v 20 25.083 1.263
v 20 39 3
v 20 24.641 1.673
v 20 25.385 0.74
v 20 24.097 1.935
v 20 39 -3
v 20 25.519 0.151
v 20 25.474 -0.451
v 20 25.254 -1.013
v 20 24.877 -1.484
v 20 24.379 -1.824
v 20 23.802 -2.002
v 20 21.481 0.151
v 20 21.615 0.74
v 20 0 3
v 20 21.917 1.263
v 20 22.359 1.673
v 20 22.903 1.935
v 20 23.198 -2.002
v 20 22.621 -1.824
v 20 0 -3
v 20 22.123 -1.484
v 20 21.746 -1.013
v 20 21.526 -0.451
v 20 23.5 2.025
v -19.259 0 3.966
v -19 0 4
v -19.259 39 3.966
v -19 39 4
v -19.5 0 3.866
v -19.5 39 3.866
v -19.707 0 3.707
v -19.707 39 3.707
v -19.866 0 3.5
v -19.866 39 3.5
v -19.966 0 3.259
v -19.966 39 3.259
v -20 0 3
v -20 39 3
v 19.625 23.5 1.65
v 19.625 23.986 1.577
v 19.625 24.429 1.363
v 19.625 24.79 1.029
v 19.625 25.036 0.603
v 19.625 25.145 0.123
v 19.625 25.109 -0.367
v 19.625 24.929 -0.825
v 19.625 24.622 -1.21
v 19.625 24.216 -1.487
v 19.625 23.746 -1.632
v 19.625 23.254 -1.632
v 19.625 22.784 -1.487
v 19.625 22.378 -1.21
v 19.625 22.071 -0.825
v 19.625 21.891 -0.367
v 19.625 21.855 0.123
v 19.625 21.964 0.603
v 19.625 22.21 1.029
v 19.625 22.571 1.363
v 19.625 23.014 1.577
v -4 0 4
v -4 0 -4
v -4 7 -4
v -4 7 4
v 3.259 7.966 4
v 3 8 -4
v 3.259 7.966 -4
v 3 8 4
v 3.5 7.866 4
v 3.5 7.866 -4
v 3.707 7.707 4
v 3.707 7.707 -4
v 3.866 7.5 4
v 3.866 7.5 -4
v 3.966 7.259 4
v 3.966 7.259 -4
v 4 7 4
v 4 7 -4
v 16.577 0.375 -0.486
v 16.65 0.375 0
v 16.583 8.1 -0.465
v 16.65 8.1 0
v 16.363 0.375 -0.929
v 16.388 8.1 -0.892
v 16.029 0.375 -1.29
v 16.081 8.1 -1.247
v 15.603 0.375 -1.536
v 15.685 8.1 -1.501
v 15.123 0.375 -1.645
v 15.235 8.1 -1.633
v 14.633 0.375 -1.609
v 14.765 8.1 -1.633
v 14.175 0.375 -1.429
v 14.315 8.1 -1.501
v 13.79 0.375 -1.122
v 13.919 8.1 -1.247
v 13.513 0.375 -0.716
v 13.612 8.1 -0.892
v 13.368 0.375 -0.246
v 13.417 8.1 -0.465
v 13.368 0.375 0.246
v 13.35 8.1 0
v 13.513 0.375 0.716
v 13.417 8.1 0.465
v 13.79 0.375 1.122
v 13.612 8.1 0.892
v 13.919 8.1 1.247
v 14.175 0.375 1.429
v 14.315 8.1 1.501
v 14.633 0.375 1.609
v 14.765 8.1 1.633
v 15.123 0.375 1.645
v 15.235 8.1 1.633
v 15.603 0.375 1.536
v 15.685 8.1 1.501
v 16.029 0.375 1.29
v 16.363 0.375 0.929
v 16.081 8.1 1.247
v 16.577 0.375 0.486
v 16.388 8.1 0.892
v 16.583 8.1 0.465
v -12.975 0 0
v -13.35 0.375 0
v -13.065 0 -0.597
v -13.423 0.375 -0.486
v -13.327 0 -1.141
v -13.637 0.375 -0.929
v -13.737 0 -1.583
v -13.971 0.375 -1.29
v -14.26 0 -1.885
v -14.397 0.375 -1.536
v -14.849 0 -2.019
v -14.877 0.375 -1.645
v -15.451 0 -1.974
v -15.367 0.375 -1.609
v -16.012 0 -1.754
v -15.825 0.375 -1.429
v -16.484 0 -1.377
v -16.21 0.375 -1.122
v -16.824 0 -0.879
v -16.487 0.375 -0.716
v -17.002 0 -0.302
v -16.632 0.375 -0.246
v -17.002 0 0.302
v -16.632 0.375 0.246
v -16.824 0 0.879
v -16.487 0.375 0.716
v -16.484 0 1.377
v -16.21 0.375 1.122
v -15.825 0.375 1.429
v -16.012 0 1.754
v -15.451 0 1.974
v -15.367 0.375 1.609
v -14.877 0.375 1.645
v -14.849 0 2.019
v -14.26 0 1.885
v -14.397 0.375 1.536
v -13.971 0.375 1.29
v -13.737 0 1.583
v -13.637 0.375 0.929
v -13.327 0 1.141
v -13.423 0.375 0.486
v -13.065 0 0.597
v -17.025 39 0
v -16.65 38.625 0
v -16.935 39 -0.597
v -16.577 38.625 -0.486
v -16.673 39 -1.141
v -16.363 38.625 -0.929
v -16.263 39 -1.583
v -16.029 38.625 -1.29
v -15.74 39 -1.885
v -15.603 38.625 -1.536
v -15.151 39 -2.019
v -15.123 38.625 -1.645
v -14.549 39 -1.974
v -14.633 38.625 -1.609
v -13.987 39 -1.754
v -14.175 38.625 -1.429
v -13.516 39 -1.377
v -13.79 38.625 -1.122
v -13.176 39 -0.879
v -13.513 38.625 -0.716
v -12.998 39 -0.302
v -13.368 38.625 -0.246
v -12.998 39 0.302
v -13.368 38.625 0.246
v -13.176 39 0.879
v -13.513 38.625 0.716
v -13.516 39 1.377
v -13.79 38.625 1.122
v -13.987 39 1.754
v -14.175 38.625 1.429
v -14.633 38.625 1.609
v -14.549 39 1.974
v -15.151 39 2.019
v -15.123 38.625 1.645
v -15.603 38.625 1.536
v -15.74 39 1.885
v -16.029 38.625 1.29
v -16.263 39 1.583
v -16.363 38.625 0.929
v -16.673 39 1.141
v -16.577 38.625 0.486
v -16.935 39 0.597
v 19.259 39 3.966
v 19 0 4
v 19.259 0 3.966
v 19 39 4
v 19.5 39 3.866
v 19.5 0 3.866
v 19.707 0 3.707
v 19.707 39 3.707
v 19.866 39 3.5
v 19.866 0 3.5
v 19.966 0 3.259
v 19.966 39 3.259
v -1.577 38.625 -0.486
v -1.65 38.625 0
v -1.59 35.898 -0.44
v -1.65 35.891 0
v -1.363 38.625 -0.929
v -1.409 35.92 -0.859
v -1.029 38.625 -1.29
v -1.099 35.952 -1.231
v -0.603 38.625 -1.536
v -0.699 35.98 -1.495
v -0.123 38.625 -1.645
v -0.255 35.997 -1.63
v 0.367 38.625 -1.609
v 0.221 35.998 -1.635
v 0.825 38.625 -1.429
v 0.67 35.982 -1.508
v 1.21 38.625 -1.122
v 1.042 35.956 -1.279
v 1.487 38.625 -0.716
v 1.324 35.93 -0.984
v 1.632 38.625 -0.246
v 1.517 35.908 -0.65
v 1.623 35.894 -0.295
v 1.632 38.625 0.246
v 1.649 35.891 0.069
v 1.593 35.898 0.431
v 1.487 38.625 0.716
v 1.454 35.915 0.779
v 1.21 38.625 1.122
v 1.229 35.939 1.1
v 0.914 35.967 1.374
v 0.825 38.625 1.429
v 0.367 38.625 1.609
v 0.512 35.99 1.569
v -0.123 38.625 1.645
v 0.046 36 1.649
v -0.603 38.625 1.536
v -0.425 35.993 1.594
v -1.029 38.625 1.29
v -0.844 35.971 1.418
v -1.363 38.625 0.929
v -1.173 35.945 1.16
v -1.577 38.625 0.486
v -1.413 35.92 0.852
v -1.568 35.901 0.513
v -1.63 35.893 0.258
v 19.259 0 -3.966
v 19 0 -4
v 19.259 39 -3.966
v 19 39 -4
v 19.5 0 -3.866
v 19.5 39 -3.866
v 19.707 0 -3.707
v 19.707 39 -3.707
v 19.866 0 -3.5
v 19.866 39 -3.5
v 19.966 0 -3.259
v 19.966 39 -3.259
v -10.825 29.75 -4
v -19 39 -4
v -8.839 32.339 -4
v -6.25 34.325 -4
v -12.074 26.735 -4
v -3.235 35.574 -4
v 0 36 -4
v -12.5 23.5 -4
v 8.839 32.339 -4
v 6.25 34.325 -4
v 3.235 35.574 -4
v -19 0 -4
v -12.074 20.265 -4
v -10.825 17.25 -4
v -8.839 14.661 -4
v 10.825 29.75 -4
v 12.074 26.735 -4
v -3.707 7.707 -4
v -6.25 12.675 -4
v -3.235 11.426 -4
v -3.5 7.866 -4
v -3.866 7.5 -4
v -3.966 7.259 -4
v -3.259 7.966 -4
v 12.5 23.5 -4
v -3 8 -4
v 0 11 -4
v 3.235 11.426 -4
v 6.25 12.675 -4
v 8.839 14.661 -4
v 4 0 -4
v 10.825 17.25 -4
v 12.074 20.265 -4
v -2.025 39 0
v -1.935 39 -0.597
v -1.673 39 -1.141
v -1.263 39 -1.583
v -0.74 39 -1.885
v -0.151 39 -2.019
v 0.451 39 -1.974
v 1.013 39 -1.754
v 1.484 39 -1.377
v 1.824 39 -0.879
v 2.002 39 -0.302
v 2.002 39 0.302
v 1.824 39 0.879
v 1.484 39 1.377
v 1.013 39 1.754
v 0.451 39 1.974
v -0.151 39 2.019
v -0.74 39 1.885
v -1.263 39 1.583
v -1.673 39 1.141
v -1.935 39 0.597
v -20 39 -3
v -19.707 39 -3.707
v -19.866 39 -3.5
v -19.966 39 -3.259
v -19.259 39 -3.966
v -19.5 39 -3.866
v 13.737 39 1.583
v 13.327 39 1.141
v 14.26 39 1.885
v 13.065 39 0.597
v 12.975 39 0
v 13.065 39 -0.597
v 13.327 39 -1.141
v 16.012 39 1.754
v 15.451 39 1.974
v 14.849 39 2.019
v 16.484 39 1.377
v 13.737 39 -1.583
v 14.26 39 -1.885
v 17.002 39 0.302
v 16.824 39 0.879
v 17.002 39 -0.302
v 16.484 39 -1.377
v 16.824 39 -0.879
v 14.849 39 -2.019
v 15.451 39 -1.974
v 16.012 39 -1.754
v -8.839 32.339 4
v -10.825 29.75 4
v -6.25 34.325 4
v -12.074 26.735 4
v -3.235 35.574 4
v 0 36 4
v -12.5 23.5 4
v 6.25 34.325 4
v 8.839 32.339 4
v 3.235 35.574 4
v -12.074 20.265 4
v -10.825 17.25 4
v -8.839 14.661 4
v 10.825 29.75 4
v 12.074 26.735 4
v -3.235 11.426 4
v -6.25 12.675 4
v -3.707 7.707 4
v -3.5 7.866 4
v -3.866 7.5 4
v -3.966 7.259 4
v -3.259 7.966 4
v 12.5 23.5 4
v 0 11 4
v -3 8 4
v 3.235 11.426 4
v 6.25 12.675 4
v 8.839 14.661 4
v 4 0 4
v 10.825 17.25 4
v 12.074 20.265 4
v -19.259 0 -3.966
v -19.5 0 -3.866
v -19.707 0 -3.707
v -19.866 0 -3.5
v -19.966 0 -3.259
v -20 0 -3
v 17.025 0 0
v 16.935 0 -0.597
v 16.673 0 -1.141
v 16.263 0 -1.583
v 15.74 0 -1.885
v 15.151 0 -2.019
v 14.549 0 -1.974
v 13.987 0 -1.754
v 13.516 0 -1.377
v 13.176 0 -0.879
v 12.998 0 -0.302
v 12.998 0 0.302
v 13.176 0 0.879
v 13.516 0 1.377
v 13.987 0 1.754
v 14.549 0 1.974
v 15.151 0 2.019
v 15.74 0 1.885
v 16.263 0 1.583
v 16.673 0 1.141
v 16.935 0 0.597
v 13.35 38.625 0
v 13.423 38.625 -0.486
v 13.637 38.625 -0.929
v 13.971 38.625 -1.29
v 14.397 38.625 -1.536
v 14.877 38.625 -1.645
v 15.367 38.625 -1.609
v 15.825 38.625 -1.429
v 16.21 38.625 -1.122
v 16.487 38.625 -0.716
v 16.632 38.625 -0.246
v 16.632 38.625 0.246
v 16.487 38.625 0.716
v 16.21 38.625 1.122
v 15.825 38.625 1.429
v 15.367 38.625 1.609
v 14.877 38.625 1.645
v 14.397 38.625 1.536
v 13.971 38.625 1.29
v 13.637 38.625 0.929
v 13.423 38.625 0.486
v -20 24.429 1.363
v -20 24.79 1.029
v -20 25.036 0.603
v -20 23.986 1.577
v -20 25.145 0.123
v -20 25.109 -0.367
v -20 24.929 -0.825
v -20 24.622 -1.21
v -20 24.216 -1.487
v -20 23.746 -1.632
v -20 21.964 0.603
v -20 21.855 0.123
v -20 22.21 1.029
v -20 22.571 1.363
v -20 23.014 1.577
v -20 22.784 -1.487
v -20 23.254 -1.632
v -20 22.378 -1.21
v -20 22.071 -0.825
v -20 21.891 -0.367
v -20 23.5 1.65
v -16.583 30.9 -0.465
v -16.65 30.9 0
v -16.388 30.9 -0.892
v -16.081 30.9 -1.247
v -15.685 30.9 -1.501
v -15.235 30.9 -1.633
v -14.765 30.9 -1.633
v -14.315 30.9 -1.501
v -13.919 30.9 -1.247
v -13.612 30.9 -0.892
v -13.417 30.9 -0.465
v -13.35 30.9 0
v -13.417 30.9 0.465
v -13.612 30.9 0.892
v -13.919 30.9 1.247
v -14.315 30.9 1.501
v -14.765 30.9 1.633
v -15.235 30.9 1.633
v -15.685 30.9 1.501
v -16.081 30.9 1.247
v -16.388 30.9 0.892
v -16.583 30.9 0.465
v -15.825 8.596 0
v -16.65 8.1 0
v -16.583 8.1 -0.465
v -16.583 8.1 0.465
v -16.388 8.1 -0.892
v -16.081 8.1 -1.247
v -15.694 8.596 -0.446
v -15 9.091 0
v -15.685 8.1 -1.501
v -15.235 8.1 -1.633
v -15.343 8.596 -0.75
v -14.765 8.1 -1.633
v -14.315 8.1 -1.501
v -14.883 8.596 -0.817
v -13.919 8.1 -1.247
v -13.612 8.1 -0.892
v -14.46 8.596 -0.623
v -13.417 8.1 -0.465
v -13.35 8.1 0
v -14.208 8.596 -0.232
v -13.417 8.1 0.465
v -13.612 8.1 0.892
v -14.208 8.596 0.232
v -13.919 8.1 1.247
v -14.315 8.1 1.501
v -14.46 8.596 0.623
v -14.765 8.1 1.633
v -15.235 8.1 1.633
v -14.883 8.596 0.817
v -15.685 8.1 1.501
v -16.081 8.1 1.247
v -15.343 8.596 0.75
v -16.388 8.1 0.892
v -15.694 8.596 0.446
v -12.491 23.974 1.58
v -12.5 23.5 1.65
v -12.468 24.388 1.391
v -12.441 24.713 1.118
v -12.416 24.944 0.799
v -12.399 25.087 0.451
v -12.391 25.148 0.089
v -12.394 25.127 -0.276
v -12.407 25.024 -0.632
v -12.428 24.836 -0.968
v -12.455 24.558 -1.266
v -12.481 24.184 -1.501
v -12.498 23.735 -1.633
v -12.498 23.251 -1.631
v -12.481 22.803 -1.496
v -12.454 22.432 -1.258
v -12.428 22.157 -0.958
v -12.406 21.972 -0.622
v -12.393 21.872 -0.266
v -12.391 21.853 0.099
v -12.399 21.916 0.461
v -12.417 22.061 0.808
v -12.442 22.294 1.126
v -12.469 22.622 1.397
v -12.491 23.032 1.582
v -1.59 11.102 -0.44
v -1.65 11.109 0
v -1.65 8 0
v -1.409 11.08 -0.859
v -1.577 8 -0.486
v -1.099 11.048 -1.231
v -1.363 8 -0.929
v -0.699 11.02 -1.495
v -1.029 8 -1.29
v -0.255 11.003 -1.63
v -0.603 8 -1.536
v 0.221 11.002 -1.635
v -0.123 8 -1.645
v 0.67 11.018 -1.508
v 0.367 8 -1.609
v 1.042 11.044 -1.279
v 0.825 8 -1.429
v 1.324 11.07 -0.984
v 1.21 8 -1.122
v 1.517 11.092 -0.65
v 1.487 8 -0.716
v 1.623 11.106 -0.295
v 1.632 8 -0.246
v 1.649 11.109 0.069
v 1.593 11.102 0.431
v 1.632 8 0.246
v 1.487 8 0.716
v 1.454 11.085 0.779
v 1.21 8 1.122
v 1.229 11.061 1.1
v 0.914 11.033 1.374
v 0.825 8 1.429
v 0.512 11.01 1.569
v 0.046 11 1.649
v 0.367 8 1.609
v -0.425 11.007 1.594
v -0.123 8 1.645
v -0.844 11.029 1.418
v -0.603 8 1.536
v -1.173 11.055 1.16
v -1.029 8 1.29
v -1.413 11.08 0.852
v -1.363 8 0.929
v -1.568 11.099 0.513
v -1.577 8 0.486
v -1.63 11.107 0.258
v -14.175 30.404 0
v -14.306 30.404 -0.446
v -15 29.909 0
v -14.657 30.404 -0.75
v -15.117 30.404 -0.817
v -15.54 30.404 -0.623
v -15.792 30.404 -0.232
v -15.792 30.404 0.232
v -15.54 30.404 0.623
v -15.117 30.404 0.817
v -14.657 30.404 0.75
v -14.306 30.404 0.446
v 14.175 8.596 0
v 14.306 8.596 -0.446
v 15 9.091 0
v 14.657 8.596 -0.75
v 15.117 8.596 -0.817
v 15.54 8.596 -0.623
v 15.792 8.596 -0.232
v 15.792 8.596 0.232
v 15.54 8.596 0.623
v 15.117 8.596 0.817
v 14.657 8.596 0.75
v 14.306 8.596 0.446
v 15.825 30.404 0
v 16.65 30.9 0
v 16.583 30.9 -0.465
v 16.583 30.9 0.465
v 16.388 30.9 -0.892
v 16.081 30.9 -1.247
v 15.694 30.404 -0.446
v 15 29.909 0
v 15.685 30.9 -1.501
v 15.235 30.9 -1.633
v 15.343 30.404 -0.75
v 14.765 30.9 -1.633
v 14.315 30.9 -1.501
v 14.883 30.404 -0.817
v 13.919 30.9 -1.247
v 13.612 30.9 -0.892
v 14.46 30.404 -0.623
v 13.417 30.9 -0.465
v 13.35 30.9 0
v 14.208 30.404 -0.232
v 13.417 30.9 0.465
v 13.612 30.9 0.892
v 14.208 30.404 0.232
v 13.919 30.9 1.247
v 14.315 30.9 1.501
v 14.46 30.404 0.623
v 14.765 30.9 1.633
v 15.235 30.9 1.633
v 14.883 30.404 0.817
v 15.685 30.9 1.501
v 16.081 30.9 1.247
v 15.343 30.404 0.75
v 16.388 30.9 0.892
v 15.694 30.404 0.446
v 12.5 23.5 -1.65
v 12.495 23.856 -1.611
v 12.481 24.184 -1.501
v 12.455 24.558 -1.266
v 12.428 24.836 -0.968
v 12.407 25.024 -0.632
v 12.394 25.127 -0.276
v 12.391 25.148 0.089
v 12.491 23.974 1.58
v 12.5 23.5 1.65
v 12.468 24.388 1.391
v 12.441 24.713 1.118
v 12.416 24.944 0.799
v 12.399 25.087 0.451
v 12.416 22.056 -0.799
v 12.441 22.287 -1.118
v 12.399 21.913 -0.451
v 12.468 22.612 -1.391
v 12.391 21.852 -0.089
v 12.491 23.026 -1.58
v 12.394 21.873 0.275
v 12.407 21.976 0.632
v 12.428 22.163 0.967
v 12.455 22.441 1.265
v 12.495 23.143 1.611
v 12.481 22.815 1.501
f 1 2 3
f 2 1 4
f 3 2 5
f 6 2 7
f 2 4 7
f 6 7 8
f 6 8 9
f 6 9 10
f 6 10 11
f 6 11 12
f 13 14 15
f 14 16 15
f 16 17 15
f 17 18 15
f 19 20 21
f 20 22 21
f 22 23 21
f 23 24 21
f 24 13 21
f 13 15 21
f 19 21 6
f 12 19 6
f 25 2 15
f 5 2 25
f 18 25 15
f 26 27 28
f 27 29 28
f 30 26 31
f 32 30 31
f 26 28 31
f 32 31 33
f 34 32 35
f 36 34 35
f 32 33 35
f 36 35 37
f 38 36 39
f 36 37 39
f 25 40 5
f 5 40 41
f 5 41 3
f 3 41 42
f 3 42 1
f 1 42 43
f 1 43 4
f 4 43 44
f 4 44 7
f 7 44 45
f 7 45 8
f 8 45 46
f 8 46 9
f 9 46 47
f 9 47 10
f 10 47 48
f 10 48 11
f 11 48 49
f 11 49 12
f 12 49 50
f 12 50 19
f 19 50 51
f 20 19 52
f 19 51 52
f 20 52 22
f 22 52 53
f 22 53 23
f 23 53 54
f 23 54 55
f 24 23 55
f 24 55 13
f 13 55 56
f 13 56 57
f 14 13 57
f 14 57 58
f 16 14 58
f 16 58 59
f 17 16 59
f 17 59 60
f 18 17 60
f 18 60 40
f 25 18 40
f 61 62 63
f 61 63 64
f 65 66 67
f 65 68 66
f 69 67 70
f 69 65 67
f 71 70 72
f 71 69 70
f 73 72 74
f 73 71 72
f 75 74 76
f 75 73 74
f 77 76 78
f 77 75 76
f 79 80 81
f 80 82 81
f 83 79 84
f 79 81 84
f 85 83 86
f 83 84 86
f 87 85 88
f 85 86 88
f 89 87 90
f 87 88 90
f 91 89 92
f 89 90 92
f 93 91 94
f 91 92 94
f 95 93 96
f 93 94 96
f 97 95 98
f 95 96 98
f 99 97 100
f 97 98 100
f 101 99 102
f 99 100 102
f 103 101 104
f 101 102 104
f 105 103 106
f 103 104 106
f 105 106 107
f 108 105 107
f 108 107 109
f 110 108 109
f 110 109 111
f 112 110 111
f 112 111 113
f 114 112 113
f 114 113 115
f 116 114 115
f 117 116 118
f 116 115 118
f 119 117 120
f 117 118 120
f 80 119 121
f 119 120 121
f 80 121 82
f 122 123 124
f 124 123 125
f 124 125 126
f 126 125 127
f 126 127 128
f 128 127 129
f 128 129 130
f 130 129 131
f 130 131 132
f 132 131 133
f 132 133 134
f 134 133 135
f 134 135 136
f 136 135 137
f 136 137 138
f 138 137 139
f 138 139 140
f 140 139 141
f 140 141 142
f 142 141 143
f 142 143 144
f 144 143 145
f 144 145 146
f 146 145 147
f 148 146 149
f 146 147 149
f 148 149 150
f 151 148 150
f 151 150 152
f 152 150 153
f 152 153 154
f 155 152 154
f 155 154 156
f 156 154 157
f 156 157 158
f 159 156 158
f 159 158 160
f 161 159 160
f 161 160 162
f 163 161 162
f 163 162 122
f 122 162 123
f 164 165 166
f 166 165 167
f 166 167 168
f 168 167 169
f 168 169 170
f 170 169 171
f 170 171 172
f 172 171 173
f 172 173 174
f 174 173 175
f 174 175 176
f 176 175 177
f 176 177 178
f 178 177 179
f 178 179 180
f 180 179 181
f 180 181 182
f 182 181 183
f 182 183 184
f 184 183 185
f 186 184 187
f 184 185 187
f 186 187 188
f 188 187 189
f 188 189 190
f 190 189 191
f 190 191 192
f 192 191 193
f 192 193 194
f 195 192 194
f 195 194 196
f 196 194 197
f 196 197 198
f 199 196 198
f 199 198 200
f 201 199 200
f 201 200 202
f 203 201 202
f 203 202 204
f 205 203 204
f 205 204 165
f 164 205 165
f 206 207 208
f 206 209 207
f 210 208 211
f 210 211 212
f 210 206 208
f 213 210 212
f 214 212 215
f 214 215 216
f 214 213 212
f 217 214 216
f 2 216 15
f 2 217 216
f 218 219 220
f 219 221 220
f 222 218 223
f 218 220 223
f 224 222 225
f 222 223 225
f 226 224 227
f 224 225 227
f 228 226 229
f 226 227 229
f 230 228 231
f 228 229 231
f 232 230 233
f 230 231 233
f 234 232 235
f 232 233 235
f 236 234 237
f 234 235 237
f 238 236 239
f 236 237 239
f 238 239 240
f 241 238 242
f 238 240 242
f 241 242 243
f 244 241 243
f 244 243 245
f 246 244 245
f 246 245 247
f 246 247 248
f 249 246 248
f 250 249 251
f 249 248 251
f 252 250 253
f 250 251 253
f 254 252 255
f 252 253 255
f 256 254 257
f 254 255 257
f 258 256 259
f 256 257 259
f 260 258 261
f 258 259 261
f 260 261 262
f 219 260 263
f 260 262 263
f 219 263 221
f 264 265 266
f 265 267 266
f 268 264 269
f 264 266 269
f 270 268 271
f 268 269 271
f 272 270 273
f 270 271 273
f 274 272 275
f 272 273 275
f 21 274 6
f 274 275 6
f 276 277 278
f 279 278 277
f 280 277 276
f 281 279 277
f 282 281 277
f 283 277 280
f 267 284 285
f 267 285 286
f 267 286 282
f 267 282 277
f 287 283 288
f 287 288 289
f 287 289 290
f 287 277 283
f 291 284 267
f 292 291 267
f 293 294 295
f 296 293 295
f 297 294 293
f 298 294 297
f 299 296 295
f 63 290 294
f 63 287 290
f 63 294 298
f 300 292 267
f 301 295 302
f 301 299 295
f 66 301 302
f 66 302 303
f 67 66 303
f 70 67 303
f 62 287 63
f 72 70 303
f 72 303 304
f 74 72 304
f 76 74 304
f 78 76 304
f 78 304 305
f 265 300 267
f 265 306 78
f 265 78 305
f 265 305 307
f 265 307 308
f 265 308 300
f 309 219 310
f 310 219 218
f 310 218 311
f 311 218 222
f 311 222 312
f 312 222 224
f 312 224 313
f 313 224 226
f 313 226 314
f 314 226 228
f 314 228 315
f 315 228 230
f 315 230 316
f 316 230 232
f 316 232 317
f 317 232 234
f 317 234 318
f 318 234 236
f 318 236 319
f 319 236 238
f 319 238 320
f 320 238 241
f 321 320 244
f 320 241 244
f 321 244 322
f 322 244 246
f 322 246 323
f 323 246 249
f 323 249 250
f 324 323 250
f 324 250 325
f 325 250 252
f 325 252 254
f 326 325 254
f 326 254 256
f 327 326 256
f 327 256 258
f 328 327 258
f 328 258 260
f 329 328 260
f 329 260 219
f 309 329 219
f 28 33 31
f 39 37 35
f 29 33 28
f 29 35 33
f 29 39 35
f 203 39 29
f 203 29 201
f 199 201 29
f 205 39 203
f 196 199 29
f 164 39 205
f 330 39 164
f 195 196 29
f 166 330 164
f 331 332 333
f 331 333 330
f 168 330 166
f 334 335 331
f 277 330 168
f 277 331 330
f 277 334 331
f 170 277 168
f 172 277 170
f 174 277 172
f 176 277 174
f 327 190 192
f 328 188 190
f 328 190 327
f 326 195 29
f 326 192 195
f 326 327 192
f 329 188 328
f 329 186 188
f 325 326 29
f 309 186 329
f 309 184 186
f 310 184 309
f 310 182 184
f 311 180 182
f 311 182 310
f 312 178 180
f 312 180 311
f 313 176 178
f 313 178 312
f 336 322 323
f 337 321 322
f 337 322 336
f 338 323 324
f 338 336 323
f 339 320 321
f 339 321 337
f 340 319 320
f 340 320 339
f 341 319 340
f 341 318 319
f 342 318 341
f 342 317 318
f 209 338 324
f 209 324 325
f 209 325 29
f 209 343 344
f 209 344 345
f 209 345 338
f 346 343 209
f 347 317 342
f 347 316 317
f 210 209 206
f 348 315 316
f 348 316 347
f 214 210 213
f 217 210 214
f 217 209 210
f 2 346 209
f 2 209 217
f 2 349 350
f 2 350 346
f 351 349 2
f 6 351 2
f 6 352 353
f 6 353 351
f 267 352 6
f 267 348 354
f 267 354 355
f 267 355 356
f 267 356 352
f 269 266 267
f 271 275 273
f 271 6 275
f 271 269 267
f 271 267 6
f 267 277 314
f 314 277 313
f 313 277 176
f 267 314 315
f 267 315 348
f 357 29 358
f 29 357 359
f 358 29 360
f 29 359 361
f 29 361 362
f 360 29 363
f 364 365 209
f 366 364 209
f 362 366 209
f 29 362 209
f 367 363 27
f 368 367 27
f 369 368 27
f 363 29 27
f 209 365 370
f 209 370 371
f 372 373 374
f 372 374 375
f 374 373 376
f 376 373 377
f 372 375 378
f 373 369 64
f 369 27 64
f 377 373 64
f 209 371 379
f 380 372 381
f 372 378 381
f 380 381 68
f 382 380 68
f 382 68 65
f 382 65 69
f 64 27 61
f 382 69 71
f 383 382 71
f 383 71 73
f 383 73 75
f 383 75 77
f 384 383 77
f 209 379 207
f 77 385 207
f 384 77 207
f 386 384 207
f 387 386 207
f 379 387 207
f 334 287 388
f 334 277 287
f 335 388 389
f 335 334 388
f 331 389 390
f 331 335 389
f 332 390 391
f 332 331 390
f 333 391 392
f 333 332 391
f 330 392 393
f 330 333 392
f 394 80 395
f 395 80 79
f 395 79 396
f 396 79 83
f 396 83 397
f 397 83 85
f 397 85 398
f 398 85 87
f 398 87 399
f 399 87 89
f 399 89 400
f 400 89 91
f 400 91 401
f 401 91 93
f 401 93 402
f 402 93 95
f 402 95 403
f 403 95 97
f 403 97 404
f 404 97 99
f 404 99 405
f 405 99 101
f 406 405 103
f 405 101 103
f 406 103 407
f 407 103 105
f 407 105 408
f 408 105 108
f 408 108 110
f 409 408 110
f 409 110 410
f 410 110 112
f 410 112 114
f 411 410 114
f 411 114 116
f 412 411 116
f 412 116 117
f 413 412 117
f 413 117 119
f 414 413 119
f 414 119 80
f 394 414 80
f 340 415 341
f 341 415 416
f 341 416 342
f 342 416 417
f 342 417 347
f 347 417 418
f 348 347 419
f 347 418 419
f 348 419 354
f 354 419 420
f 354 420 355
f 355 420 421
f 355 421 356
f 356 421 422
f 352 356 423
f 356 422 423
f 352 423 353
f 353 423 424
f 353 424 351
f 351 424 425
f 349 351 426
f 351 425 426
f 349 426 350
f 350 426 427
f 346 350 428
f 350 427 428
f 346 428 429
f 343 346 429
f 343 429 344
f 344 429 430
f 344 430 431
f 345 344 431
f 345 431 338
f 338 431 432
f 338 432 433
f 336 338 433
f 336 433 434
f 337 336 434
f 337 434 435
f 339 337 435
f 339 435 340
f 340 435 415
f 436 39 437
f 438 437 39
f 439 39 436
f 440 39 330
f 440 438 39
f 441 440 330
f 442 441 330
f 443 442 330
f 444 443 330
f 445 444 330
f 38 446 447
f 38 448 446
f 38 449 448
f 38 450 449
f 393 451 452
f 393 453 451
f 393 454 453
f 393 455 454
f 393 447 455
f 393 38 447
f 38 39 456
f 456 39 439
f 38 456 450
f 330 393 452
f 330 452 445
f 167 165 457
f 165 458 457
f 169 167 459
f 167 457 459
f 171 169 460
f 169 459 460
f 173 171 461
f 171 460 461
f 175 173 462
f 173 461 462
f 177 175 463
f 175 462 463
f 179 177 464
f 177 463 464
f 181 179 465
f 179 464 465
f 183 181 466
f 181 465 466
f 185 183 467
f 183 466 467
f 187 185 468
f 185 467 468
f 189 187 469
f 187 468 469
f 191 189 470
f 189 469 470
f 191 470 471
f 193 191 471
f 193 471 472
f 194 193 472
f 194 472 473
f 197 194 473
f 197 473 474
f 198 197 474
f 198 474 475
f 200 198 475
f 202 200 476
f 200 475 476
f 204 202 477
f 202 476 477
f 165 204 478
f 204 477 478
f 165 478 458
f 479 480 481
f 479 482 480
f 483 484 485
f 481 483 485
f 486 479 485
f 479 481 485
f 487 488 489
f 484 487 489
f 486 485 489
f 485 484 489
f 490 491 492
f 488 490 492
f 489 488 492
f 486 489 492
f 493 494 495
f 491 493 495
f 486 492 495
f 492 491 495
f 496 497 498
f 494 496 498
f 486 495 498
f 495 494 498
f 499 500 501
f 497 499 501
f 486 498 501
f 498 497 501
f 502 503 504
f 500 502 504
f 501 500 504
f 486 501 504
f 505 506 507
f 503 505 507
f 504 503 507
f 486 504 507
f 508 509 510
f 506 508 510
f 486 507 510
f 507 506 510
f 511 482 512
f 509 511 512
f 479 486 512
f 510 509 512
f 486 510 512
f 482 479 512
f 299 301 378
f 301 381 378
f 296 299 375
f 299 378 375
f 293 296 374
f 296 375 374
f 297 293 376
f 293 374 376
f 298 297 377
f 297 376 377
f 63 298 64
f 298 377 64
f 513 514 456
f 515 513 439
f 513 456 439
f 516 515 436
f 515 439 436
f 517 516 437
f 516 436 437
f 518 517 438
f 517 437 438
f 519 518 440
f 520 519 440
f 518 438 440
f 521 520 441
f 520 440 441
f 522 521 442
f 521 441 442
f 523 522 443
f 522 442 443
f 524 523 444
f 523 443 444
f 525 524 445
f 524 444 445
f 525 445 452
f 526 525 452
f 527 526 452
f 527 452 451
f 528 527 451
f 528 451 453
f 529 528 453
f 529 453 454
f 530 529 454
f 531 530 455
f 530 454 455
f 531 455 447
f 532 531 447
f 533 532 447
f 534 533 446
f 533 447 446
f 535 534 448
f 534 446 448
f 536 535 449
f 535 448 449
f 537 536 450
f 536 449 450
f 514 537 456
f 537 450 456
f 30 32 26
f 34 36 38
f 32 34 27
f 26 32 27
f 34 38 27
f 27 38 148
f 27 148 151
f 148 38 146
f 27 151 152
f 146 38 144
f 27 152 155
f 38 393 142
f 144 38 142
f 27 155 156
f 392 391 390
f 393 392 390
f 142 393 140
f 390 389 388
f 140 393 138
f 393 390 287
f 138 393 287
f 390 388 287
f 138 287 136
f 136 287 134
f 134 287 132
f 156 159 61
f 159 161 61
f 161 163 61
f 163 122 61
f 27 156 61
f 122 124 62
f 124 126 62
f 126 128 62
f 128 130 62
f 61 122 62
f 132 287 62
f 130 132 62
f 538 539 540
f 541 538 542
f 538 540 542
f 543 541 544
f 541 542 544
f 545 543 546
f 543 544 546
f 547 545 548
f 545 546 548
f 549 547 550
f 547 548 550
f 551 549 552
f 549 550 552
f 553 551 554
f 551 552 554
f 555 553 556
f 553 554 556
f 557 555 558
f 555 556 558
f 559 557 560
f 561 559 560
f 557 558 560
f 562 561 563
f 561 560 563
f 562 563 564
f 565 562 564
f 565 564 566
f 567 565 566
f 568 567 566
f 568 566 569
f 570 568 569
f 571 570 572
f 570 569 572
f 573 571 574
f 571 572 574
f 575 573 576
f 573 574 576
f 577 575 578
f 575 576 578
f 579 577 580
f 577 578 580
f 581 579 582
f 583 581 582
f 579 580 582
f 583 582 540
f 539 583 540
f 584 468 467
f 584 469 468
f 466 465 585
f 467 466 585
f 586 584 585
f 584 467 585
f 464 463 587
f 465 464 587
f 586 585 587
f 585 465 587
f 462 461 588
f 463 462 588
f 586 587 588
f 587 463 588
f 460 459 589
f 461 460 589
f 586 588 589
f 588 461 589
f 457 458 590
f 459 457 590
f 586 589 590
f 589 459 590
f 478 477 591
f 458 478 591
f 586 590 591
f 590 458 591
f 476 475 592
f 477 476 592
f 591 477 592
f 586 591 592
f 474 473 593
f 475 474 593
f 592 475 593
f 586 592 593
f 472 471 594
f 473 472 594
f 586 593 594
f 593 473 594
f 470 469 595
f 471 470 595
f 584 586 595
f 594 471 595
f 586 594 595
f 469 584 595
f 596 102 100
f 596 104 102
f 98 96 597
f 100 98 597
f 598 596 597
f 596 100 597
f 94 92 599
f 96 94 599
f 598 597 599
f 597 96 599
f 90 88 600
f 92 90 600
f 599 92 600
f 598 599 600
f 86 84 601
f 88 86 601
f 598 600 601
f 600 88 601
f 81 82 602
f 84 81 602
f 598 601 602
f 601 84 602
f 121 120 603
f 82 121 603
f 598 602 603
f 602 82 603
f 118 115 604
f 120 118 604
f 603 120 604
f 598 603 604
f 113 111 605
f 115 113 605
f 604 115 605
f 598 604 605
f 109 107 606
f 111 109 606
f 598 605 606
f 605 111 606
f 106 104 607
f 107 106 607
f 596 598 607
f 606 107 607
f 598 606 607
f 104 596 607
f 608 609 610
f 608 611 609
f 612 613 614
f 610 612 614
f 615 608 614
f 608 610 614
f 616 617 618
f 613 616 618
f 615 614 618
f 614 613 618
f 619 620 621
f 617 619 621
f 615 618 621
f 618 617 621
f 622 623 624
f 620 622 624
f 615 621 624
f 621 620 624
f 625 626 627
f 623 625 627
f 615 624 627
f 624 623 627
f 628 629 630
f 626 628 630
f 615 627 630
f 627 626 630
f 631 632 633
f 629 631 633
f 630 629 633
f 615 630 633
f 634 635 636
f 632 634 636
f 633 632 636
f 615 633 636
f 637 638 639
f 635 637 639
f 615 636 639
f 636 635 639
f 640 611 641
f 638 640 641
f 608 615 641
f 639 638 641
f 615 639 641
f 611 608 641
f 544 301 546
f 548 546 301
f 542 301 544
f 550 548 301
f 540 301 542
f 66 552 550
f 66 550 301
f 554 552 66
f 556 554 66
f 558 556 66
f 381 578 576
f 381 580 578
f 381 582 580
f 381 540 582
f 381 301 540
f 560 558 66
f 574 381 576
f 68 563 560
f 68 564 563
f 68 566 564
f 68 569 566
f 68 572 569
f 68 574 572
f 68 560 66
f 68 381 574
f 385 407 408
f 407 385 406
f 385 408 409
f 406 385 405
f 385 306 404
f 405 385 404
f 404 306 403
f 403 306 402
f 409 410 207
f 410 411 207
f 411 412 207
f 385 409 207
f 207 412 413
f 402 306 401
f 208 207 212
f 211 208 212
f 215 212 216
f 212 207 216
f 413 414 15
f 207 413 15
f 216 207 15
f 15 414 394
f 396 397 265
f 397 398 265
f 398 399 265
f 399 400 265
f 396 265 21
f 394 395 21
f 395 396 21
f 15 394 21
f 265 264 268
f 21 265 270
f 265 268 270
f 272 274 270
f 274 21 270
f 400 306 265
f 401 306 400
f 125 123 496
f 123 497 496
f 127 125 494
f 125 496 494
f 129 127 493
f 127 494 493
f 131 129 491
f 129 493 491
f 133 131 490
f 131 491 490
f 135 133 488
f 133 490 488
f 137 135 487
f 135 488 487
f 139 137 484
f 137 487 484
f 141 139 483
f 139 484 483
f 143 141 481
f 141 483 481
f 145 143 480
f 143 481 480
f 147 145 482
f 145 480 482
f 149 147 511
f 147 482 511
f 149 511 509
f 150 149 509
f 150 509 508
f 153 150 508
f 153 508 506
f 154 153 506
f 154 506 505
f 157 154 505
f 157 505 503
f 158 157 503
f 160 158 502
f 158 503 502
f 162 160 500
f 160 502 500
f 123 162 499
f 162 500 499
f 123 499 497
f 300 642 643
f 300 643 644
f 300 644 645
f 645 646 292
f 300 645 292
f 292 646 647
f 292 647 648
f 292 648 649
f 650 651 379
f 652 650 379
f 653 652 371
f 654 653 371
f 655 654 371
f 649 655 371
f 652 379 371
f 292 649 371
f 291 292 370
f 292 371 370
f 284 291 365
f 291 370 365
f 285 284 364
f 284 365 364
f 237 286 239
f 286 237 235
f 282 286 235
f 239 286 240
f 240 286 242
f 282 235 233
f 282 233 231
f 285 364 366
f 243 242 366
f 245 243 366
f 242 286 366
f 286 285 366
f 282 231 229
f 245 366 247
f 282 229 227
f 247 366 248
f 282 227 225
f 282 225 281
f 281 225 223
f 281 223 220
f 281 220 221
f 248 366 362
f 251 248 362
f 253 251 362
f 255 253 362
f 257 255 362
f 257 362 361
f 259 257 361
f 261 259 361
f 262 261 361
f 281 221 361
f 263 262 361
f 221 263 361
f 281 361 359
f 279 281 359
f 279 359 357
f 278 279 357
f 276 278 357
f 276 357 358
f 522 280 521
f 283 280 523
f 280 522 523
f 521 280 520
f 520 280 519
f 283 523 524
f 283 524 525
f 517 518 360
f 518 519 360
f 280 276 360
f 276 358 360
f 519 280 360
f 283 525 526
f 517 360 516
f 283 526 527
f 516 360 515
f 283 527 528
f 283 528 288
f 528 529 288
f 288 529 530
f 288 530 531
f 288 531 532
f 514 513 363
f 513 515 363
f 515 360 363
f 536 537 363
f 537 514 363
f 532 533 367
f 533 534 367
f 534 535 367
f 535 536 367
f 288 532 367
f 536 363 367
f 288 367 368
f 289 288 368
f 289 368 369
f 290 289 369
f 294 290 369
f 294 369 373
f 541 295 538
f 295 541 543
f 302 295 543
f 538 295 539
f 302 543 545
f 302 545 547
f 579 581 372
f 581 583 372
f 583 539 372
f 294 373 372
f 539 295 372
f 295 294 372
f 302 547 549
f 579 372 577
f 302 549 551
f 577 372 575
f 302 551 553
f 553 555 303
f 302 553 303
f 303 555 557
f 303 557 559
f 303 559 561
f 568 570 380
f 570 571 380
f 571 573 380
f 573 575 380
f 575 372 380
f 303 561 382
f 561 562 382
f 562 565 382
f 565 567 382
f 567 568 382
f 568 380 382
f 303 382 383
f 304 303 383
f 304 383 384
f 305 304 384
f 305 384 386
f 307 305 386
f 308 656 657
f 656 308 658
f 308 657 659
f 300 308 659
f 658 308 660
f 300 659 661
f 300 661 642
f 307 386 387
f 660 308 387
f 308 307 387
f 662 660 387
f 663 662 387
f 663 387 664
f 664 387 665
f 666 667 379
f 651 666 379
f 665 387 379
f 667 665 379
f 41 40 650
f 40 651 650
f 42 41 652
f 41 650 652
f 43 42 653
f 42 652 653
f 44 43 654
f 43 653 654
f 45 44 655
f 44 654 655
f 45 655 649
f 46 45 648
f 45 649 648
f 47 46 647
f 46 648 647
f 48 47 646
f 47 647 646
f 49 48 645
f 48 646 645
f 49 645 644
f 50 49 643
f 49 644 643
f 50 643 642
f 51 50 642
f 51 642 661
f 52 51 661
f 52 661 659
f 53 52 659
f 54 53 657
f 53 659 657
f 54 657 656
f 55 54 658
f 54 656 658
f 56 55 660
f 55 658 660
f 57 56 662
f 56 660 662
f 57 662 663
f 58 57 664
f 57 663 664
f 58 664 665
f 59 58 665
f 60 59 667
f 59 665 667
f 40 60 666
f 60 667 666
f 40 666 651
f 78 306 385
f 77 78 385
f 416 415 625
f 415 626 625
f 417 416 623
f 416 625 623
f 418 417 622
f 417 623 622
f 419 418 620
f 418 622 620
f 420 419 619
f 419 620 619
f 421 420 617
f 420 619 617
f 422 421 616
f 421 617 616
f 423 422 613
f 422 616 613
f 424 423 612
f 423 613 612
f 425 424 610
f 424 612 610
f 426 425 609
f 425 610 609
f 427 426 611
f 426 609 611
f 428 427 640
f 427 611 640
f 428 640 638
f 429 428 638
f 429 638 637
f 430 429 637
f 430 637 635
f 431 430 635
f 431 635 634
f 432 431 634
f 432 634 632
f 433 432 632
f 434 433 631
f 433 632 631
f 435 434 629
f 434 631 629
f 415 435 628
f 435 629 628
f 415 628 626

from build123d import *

# Parameters (mm, degrees)
SKETCH_1_W                   = 40
SKETCH_1_H                   = 8
EXTRUDE_1_DEPTH              = 39
HOLE_WIZARD_M4_2_D           = 3.3
HOLE_WIZARD_M4_2_DEPTH       = 8.1
HOLE_WIZARD_M4_2_CSINK_D     = 4.05
HOLE_WIZARD_M4_2_CSINK_ANGLE = 90
HOLE_WIZARD_M4_2_TIP         = 0.991420021
HOLE_WIZARD_M4_4_D           = 3.3
HOLE_WIZARD_M4_4_DEPTH       = 8.1
HOLE_WIZARD_M4_4_CSINK_D     = 4.05
HOLE_WIZARD_M4_4_CSINK_ANGLE = 90
HOLE_WIZARD_M4_4_TIP         = 0.991420021
SKETCH_11_R                  = 12.5
CUT_EXTRUDE_1_DEPTH          = 39
HOLE_WIZARD_M4_5_D           = 3.3
HOLE_WIZARD_M4_5_CSINK_D     = 4.05
HOLE_WIZARD_M4_5_CSINK_ANGLE = 90
SKETCH_14_W                  = 8
SKETCH_14_H                  = 8
CUT_EXTRUDE_2_DEPTH          = 8
HOLE_WIZARD_M4_6_D           = 3.3
HOLE_WIZARD_M4_6_CSINK_D     = 4.05
HOLE_WIZARD_M4_6_CSINK_ANGLE = 90
FILLET_1_R                   = 1
FILLET_2_R                   = 1


with BuildPart() as part:
    # 草图1 → 凸台-拉伸1 (new body)
    with BuildSketch(Plane(origin=(0, 0, 0), x_dir=(1, 0, 0), z_dir=(0, 1, 0))):
        Rectangle(SKETCH_1_W, SKETCH_1_H)
    extrude(amount=EXTRUDE_1_DEPTH)

    # M4 螺纹孔2
    with Locations(Plane(origin=(0, 39, 0), x_dir=(1, 0, 0), z_dir=(0, 1, 0))):
        with Locations((-15, 0), (15, 0)):
            CounterSinkHole(HOLE_WIZARD_M4_2_D / 2, HOLE_WIZARD_M4_2_CSINK_D / 2, depth=HOLE_WIZARD_M4_2_DEPTH, counter_sink_angle=HOLE_WIZARD_M4_2_CSINK_ANGLE)
            with Locations((0, 0, -(HOLE_WIZARD_M4_2_DEPTH + HOLE_WIZARD_M4_2_TIP / 2))):  # 118° drill point
                Cone(0, HOLE_WIZARD_M4_2_D / 2, HOLE_WIZARD_M4_2_TIP, mode=Mode.SUBTRACT)

    # M4 螺纹孔4
    with Locations(Plane(origin=(0, 0, 0), x_dir=(-1, 0, 0), z_dir=(0, -1, 0))):
        with Locations((15, 0), (-15, 0)):
            CounterSinkHole(HOLE_WIZARD_M4_4_D / 2, HOLE_WIZARD_M4_4_CSINK_D / 2, depth=HOLE_WIZARD_M4_4_DEPTH, counter_sink_angle=HOLE_WIZARD_M4_4_CSINK_ANGLE)
            with Locations((0, 0, -(HOLE_WIZARD_M4_4_DEPTH + HOLE_WIZARD_M4_4_TIP / 2))):  # 118° drill point
                Cone(0, HOLE_WIZARD_M4_4_D / 2, HOLE_WIZARD_M4_4_TIP, mode=Mode.SUBTRACT)

    # 草图11 → 切除-拉伸1 (cut)
    with BuildSketch(Plane.XY.offset(4)):
        with Locations((0, 23.5)):
            Circle(SKETCH_11_R)
    extrude(amount=-CUT_EXTRUDE_1_DEPTH, mode=Mode.SUBTRACT)

    # M4 螺纹孔5 (through all)
    with Locations(Plane(origin=(0, 39, 0), x_dir=(1, 0, 0), z_dir=(0, 1, 0))):
        with Locations((0, 0)):
            CounterSinkHole(HOLE_WIZARD_M4_5_D / 2, HOLE_WIZARD_M4_5_CSINK_D / 2, counter_sink_angle=HOLE_WIZARD_M4_5_CSINK_ANGLE)

    # 草图14 → 切除-拉伸2 (cut)
    with BuildSketch(Plane.XZ):
        Rectangle(SKETCH_14_W, SKETCH_14_H)
    extrude(amount=-CUT_EXTRUDE_2_DEPTH, mode=Mode.SUBTRACT)

    # M4 螺纹孔6 (through all)
    with Locations(Plane(origin=(20, 0, 0), x_dir=(0, 0, -1), z_dir=(1, 0, 0))):
        with Locations((0, 23.5)):
            CounterSinkHole(HOLE_WIZARD_M4_6_D / 2, HOLE_WIZARD_M4_6_CSINK_D / 2, counter_sink_angle=HOLE_WIZARD_M4_6_CSINK_ANGLE)

    # 圆角1
    fillet_1_edges = [part.edges().sort_by_distance(p)[0] for p in [
        (4, 8, 0),
        (-4, 8, 0),
    ]]
    fillet(fillet_1_edges, radius=FILLET_1_R)

    # 圆角2
    fillet_2_edges = [part.edges().sort_by_distance(p)[0] for p in [
        (20, 19.5, 4),
        (-20, 19.5, 4),
        (-20, 19.5, -4),
        (20, 19.5, -4),
    ]]
    fillet(fillet_2_edges, radius=FILLET_2_R)


solid = part.part
